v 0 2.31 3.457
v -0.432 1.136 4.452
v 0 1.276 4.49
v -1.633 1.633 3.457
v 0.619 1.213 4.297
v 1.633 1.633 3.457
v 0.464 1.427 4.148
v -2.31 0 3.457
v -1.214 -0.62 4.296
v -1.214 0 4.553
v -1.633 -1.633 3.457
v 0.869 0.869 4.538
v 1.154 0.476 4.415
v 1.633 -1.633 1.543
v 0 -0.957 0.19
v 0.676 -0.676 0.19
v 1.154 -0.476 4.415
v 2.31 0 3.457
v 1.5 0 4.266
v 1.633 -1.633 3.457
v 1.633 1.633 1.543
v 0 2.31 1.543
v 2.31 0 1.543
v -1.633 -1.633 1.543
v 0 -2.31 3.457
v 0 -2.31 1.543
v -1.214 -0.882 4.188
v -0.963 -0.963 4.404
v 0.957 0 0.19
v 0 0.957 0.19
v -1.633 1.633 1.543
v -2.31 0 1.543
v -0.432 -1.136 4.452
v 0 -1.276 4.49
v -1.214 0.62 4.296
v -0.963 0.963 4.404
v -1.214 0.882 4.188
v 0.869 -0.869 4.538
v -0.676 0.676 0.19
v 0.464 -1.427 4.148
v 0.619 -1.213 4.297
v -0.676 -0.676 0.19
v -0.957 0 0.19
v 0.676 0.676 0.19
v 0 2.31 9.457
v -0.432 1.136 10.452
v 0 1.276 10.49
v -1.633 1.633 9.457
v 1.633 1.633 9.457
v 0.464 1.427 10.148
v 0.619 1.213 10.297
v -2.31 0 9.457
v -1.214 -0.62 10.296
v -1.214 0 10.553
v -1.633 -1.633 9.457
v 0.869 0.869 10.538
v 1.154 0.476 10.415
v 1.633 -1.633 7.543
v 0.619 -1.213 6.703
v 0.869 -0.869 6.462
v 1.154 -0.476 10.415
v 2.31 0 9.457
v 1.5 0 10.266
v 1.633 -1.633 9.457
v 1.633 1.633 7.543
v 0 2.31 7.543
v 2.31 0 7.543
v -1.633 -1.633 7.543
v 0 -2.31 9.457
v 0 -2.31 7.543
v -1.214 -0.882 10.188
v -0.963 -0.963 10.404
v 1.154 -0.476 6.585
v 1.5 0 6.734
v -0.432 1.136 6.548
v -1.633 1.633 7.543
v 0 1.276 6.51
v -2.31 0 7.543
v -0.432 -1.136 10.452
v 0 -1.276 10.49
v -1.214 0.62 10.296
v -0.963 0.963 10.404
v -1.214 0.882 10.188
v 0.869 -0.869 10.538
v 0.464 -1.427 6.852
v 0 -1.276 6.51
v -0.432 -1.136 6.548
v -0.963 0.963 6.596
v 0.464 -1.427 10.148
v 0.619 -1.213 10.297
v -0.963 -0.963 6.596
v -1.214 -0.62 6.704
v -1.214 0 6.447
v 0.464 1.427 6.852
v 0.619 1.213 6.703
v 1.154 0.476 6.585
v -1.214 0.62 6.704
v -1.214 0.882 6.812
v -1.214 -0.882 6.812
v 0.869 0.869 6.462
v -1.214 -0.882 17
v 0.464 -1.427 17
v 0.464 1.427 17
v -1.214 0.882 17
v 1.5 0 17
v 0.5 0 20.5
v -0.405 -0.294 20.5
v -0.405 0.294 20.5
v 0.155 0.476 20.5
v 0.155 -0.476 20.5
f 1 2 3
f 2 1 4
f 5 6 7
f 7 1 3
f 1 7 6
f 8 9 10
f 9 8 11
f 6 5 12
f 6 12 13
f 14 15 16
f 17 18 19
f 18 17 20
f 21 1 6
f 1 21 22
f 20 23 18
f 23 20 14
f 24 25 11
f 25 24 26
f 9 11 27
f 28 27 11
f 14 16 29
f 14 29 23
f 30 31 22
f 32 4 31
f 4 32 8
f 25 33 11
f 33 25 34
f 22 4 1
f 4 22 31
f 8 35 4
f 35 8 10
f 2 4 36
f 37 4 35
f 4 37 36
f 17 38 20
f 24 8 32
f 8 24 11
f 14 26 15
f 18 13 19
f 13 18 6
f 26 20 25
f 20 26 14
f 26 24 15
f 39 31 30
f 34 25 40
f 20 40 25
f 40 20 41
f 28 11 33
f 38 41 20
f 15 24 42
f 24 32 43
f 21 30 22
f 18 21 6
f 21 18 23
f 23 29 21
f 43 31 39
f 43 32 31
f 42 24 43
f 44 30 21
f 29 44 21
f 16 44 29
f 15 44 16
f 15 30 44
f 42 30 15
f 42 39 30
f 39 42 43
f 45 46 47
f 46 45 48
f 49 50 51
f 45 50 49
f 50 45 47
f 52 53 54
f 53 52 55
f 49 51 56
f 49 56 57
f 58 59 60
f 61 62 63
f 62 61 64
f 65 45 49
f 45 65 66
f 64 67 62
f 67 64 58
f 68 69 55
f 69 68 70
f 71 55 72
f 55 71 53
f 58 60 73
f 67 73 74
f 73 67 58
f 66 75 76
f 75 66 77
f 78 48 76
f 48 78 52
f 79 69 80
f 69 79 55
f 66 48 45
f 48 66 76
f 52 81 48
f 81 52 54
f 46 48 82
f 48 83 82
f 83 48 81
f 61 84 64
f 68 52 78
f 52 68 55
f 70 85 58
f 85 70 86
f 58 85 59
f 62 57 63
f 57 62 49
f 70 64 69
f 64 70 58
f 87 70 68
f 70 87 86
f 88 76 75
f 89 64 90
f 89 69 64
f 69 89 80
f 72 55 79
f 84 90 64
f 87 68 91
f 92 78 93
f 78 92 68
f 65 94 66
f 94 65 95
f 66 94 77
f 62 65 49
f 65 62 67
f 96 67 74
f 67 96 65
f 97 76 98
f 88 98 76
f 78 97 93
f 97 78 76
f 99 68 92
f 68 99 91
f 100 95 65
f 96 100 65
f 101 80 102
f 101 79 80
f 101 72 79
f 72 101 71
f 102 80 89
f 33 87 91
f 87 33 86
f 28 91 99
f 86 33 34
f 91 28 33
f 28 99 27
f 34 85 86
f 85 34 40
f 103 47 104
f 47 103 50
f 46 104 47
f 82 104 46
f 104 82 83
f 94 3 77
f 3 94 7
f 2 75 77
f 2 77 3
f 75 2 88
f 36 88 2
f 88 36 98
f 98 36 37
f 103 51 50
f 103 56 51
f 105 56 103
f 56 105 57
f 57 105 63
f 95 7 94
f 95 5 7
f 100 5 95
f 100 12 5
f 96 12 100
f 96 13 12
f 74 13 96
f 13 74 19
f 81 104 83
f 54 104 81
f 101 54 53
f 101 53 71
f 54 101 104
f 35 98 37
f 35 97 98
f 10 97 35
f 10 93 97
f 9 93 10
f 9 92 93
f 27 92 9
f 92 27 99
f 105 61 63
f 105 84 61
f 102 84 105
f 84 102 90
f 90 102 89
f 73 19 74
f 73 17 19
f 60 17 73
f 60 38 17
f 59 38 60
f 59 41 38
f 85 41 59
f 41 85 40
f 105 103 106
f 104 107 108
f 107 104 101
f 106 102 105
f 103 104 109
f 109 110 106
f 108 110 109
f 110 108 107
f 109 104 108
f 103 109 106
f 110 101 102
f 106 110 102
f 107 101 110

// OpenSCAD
// Spheres for grip
translate([0, 0, 2.5]) sphere(d = 5);
translate([0, 0, 8.5]) sphere(d = 5);

// Main Shaft
translate([0, 0, 2]) cylinder(15, 1.5, 1.5);

// Point
translate([0, 0, 17]) cylinder(3.5, 1.5, 0.5);
